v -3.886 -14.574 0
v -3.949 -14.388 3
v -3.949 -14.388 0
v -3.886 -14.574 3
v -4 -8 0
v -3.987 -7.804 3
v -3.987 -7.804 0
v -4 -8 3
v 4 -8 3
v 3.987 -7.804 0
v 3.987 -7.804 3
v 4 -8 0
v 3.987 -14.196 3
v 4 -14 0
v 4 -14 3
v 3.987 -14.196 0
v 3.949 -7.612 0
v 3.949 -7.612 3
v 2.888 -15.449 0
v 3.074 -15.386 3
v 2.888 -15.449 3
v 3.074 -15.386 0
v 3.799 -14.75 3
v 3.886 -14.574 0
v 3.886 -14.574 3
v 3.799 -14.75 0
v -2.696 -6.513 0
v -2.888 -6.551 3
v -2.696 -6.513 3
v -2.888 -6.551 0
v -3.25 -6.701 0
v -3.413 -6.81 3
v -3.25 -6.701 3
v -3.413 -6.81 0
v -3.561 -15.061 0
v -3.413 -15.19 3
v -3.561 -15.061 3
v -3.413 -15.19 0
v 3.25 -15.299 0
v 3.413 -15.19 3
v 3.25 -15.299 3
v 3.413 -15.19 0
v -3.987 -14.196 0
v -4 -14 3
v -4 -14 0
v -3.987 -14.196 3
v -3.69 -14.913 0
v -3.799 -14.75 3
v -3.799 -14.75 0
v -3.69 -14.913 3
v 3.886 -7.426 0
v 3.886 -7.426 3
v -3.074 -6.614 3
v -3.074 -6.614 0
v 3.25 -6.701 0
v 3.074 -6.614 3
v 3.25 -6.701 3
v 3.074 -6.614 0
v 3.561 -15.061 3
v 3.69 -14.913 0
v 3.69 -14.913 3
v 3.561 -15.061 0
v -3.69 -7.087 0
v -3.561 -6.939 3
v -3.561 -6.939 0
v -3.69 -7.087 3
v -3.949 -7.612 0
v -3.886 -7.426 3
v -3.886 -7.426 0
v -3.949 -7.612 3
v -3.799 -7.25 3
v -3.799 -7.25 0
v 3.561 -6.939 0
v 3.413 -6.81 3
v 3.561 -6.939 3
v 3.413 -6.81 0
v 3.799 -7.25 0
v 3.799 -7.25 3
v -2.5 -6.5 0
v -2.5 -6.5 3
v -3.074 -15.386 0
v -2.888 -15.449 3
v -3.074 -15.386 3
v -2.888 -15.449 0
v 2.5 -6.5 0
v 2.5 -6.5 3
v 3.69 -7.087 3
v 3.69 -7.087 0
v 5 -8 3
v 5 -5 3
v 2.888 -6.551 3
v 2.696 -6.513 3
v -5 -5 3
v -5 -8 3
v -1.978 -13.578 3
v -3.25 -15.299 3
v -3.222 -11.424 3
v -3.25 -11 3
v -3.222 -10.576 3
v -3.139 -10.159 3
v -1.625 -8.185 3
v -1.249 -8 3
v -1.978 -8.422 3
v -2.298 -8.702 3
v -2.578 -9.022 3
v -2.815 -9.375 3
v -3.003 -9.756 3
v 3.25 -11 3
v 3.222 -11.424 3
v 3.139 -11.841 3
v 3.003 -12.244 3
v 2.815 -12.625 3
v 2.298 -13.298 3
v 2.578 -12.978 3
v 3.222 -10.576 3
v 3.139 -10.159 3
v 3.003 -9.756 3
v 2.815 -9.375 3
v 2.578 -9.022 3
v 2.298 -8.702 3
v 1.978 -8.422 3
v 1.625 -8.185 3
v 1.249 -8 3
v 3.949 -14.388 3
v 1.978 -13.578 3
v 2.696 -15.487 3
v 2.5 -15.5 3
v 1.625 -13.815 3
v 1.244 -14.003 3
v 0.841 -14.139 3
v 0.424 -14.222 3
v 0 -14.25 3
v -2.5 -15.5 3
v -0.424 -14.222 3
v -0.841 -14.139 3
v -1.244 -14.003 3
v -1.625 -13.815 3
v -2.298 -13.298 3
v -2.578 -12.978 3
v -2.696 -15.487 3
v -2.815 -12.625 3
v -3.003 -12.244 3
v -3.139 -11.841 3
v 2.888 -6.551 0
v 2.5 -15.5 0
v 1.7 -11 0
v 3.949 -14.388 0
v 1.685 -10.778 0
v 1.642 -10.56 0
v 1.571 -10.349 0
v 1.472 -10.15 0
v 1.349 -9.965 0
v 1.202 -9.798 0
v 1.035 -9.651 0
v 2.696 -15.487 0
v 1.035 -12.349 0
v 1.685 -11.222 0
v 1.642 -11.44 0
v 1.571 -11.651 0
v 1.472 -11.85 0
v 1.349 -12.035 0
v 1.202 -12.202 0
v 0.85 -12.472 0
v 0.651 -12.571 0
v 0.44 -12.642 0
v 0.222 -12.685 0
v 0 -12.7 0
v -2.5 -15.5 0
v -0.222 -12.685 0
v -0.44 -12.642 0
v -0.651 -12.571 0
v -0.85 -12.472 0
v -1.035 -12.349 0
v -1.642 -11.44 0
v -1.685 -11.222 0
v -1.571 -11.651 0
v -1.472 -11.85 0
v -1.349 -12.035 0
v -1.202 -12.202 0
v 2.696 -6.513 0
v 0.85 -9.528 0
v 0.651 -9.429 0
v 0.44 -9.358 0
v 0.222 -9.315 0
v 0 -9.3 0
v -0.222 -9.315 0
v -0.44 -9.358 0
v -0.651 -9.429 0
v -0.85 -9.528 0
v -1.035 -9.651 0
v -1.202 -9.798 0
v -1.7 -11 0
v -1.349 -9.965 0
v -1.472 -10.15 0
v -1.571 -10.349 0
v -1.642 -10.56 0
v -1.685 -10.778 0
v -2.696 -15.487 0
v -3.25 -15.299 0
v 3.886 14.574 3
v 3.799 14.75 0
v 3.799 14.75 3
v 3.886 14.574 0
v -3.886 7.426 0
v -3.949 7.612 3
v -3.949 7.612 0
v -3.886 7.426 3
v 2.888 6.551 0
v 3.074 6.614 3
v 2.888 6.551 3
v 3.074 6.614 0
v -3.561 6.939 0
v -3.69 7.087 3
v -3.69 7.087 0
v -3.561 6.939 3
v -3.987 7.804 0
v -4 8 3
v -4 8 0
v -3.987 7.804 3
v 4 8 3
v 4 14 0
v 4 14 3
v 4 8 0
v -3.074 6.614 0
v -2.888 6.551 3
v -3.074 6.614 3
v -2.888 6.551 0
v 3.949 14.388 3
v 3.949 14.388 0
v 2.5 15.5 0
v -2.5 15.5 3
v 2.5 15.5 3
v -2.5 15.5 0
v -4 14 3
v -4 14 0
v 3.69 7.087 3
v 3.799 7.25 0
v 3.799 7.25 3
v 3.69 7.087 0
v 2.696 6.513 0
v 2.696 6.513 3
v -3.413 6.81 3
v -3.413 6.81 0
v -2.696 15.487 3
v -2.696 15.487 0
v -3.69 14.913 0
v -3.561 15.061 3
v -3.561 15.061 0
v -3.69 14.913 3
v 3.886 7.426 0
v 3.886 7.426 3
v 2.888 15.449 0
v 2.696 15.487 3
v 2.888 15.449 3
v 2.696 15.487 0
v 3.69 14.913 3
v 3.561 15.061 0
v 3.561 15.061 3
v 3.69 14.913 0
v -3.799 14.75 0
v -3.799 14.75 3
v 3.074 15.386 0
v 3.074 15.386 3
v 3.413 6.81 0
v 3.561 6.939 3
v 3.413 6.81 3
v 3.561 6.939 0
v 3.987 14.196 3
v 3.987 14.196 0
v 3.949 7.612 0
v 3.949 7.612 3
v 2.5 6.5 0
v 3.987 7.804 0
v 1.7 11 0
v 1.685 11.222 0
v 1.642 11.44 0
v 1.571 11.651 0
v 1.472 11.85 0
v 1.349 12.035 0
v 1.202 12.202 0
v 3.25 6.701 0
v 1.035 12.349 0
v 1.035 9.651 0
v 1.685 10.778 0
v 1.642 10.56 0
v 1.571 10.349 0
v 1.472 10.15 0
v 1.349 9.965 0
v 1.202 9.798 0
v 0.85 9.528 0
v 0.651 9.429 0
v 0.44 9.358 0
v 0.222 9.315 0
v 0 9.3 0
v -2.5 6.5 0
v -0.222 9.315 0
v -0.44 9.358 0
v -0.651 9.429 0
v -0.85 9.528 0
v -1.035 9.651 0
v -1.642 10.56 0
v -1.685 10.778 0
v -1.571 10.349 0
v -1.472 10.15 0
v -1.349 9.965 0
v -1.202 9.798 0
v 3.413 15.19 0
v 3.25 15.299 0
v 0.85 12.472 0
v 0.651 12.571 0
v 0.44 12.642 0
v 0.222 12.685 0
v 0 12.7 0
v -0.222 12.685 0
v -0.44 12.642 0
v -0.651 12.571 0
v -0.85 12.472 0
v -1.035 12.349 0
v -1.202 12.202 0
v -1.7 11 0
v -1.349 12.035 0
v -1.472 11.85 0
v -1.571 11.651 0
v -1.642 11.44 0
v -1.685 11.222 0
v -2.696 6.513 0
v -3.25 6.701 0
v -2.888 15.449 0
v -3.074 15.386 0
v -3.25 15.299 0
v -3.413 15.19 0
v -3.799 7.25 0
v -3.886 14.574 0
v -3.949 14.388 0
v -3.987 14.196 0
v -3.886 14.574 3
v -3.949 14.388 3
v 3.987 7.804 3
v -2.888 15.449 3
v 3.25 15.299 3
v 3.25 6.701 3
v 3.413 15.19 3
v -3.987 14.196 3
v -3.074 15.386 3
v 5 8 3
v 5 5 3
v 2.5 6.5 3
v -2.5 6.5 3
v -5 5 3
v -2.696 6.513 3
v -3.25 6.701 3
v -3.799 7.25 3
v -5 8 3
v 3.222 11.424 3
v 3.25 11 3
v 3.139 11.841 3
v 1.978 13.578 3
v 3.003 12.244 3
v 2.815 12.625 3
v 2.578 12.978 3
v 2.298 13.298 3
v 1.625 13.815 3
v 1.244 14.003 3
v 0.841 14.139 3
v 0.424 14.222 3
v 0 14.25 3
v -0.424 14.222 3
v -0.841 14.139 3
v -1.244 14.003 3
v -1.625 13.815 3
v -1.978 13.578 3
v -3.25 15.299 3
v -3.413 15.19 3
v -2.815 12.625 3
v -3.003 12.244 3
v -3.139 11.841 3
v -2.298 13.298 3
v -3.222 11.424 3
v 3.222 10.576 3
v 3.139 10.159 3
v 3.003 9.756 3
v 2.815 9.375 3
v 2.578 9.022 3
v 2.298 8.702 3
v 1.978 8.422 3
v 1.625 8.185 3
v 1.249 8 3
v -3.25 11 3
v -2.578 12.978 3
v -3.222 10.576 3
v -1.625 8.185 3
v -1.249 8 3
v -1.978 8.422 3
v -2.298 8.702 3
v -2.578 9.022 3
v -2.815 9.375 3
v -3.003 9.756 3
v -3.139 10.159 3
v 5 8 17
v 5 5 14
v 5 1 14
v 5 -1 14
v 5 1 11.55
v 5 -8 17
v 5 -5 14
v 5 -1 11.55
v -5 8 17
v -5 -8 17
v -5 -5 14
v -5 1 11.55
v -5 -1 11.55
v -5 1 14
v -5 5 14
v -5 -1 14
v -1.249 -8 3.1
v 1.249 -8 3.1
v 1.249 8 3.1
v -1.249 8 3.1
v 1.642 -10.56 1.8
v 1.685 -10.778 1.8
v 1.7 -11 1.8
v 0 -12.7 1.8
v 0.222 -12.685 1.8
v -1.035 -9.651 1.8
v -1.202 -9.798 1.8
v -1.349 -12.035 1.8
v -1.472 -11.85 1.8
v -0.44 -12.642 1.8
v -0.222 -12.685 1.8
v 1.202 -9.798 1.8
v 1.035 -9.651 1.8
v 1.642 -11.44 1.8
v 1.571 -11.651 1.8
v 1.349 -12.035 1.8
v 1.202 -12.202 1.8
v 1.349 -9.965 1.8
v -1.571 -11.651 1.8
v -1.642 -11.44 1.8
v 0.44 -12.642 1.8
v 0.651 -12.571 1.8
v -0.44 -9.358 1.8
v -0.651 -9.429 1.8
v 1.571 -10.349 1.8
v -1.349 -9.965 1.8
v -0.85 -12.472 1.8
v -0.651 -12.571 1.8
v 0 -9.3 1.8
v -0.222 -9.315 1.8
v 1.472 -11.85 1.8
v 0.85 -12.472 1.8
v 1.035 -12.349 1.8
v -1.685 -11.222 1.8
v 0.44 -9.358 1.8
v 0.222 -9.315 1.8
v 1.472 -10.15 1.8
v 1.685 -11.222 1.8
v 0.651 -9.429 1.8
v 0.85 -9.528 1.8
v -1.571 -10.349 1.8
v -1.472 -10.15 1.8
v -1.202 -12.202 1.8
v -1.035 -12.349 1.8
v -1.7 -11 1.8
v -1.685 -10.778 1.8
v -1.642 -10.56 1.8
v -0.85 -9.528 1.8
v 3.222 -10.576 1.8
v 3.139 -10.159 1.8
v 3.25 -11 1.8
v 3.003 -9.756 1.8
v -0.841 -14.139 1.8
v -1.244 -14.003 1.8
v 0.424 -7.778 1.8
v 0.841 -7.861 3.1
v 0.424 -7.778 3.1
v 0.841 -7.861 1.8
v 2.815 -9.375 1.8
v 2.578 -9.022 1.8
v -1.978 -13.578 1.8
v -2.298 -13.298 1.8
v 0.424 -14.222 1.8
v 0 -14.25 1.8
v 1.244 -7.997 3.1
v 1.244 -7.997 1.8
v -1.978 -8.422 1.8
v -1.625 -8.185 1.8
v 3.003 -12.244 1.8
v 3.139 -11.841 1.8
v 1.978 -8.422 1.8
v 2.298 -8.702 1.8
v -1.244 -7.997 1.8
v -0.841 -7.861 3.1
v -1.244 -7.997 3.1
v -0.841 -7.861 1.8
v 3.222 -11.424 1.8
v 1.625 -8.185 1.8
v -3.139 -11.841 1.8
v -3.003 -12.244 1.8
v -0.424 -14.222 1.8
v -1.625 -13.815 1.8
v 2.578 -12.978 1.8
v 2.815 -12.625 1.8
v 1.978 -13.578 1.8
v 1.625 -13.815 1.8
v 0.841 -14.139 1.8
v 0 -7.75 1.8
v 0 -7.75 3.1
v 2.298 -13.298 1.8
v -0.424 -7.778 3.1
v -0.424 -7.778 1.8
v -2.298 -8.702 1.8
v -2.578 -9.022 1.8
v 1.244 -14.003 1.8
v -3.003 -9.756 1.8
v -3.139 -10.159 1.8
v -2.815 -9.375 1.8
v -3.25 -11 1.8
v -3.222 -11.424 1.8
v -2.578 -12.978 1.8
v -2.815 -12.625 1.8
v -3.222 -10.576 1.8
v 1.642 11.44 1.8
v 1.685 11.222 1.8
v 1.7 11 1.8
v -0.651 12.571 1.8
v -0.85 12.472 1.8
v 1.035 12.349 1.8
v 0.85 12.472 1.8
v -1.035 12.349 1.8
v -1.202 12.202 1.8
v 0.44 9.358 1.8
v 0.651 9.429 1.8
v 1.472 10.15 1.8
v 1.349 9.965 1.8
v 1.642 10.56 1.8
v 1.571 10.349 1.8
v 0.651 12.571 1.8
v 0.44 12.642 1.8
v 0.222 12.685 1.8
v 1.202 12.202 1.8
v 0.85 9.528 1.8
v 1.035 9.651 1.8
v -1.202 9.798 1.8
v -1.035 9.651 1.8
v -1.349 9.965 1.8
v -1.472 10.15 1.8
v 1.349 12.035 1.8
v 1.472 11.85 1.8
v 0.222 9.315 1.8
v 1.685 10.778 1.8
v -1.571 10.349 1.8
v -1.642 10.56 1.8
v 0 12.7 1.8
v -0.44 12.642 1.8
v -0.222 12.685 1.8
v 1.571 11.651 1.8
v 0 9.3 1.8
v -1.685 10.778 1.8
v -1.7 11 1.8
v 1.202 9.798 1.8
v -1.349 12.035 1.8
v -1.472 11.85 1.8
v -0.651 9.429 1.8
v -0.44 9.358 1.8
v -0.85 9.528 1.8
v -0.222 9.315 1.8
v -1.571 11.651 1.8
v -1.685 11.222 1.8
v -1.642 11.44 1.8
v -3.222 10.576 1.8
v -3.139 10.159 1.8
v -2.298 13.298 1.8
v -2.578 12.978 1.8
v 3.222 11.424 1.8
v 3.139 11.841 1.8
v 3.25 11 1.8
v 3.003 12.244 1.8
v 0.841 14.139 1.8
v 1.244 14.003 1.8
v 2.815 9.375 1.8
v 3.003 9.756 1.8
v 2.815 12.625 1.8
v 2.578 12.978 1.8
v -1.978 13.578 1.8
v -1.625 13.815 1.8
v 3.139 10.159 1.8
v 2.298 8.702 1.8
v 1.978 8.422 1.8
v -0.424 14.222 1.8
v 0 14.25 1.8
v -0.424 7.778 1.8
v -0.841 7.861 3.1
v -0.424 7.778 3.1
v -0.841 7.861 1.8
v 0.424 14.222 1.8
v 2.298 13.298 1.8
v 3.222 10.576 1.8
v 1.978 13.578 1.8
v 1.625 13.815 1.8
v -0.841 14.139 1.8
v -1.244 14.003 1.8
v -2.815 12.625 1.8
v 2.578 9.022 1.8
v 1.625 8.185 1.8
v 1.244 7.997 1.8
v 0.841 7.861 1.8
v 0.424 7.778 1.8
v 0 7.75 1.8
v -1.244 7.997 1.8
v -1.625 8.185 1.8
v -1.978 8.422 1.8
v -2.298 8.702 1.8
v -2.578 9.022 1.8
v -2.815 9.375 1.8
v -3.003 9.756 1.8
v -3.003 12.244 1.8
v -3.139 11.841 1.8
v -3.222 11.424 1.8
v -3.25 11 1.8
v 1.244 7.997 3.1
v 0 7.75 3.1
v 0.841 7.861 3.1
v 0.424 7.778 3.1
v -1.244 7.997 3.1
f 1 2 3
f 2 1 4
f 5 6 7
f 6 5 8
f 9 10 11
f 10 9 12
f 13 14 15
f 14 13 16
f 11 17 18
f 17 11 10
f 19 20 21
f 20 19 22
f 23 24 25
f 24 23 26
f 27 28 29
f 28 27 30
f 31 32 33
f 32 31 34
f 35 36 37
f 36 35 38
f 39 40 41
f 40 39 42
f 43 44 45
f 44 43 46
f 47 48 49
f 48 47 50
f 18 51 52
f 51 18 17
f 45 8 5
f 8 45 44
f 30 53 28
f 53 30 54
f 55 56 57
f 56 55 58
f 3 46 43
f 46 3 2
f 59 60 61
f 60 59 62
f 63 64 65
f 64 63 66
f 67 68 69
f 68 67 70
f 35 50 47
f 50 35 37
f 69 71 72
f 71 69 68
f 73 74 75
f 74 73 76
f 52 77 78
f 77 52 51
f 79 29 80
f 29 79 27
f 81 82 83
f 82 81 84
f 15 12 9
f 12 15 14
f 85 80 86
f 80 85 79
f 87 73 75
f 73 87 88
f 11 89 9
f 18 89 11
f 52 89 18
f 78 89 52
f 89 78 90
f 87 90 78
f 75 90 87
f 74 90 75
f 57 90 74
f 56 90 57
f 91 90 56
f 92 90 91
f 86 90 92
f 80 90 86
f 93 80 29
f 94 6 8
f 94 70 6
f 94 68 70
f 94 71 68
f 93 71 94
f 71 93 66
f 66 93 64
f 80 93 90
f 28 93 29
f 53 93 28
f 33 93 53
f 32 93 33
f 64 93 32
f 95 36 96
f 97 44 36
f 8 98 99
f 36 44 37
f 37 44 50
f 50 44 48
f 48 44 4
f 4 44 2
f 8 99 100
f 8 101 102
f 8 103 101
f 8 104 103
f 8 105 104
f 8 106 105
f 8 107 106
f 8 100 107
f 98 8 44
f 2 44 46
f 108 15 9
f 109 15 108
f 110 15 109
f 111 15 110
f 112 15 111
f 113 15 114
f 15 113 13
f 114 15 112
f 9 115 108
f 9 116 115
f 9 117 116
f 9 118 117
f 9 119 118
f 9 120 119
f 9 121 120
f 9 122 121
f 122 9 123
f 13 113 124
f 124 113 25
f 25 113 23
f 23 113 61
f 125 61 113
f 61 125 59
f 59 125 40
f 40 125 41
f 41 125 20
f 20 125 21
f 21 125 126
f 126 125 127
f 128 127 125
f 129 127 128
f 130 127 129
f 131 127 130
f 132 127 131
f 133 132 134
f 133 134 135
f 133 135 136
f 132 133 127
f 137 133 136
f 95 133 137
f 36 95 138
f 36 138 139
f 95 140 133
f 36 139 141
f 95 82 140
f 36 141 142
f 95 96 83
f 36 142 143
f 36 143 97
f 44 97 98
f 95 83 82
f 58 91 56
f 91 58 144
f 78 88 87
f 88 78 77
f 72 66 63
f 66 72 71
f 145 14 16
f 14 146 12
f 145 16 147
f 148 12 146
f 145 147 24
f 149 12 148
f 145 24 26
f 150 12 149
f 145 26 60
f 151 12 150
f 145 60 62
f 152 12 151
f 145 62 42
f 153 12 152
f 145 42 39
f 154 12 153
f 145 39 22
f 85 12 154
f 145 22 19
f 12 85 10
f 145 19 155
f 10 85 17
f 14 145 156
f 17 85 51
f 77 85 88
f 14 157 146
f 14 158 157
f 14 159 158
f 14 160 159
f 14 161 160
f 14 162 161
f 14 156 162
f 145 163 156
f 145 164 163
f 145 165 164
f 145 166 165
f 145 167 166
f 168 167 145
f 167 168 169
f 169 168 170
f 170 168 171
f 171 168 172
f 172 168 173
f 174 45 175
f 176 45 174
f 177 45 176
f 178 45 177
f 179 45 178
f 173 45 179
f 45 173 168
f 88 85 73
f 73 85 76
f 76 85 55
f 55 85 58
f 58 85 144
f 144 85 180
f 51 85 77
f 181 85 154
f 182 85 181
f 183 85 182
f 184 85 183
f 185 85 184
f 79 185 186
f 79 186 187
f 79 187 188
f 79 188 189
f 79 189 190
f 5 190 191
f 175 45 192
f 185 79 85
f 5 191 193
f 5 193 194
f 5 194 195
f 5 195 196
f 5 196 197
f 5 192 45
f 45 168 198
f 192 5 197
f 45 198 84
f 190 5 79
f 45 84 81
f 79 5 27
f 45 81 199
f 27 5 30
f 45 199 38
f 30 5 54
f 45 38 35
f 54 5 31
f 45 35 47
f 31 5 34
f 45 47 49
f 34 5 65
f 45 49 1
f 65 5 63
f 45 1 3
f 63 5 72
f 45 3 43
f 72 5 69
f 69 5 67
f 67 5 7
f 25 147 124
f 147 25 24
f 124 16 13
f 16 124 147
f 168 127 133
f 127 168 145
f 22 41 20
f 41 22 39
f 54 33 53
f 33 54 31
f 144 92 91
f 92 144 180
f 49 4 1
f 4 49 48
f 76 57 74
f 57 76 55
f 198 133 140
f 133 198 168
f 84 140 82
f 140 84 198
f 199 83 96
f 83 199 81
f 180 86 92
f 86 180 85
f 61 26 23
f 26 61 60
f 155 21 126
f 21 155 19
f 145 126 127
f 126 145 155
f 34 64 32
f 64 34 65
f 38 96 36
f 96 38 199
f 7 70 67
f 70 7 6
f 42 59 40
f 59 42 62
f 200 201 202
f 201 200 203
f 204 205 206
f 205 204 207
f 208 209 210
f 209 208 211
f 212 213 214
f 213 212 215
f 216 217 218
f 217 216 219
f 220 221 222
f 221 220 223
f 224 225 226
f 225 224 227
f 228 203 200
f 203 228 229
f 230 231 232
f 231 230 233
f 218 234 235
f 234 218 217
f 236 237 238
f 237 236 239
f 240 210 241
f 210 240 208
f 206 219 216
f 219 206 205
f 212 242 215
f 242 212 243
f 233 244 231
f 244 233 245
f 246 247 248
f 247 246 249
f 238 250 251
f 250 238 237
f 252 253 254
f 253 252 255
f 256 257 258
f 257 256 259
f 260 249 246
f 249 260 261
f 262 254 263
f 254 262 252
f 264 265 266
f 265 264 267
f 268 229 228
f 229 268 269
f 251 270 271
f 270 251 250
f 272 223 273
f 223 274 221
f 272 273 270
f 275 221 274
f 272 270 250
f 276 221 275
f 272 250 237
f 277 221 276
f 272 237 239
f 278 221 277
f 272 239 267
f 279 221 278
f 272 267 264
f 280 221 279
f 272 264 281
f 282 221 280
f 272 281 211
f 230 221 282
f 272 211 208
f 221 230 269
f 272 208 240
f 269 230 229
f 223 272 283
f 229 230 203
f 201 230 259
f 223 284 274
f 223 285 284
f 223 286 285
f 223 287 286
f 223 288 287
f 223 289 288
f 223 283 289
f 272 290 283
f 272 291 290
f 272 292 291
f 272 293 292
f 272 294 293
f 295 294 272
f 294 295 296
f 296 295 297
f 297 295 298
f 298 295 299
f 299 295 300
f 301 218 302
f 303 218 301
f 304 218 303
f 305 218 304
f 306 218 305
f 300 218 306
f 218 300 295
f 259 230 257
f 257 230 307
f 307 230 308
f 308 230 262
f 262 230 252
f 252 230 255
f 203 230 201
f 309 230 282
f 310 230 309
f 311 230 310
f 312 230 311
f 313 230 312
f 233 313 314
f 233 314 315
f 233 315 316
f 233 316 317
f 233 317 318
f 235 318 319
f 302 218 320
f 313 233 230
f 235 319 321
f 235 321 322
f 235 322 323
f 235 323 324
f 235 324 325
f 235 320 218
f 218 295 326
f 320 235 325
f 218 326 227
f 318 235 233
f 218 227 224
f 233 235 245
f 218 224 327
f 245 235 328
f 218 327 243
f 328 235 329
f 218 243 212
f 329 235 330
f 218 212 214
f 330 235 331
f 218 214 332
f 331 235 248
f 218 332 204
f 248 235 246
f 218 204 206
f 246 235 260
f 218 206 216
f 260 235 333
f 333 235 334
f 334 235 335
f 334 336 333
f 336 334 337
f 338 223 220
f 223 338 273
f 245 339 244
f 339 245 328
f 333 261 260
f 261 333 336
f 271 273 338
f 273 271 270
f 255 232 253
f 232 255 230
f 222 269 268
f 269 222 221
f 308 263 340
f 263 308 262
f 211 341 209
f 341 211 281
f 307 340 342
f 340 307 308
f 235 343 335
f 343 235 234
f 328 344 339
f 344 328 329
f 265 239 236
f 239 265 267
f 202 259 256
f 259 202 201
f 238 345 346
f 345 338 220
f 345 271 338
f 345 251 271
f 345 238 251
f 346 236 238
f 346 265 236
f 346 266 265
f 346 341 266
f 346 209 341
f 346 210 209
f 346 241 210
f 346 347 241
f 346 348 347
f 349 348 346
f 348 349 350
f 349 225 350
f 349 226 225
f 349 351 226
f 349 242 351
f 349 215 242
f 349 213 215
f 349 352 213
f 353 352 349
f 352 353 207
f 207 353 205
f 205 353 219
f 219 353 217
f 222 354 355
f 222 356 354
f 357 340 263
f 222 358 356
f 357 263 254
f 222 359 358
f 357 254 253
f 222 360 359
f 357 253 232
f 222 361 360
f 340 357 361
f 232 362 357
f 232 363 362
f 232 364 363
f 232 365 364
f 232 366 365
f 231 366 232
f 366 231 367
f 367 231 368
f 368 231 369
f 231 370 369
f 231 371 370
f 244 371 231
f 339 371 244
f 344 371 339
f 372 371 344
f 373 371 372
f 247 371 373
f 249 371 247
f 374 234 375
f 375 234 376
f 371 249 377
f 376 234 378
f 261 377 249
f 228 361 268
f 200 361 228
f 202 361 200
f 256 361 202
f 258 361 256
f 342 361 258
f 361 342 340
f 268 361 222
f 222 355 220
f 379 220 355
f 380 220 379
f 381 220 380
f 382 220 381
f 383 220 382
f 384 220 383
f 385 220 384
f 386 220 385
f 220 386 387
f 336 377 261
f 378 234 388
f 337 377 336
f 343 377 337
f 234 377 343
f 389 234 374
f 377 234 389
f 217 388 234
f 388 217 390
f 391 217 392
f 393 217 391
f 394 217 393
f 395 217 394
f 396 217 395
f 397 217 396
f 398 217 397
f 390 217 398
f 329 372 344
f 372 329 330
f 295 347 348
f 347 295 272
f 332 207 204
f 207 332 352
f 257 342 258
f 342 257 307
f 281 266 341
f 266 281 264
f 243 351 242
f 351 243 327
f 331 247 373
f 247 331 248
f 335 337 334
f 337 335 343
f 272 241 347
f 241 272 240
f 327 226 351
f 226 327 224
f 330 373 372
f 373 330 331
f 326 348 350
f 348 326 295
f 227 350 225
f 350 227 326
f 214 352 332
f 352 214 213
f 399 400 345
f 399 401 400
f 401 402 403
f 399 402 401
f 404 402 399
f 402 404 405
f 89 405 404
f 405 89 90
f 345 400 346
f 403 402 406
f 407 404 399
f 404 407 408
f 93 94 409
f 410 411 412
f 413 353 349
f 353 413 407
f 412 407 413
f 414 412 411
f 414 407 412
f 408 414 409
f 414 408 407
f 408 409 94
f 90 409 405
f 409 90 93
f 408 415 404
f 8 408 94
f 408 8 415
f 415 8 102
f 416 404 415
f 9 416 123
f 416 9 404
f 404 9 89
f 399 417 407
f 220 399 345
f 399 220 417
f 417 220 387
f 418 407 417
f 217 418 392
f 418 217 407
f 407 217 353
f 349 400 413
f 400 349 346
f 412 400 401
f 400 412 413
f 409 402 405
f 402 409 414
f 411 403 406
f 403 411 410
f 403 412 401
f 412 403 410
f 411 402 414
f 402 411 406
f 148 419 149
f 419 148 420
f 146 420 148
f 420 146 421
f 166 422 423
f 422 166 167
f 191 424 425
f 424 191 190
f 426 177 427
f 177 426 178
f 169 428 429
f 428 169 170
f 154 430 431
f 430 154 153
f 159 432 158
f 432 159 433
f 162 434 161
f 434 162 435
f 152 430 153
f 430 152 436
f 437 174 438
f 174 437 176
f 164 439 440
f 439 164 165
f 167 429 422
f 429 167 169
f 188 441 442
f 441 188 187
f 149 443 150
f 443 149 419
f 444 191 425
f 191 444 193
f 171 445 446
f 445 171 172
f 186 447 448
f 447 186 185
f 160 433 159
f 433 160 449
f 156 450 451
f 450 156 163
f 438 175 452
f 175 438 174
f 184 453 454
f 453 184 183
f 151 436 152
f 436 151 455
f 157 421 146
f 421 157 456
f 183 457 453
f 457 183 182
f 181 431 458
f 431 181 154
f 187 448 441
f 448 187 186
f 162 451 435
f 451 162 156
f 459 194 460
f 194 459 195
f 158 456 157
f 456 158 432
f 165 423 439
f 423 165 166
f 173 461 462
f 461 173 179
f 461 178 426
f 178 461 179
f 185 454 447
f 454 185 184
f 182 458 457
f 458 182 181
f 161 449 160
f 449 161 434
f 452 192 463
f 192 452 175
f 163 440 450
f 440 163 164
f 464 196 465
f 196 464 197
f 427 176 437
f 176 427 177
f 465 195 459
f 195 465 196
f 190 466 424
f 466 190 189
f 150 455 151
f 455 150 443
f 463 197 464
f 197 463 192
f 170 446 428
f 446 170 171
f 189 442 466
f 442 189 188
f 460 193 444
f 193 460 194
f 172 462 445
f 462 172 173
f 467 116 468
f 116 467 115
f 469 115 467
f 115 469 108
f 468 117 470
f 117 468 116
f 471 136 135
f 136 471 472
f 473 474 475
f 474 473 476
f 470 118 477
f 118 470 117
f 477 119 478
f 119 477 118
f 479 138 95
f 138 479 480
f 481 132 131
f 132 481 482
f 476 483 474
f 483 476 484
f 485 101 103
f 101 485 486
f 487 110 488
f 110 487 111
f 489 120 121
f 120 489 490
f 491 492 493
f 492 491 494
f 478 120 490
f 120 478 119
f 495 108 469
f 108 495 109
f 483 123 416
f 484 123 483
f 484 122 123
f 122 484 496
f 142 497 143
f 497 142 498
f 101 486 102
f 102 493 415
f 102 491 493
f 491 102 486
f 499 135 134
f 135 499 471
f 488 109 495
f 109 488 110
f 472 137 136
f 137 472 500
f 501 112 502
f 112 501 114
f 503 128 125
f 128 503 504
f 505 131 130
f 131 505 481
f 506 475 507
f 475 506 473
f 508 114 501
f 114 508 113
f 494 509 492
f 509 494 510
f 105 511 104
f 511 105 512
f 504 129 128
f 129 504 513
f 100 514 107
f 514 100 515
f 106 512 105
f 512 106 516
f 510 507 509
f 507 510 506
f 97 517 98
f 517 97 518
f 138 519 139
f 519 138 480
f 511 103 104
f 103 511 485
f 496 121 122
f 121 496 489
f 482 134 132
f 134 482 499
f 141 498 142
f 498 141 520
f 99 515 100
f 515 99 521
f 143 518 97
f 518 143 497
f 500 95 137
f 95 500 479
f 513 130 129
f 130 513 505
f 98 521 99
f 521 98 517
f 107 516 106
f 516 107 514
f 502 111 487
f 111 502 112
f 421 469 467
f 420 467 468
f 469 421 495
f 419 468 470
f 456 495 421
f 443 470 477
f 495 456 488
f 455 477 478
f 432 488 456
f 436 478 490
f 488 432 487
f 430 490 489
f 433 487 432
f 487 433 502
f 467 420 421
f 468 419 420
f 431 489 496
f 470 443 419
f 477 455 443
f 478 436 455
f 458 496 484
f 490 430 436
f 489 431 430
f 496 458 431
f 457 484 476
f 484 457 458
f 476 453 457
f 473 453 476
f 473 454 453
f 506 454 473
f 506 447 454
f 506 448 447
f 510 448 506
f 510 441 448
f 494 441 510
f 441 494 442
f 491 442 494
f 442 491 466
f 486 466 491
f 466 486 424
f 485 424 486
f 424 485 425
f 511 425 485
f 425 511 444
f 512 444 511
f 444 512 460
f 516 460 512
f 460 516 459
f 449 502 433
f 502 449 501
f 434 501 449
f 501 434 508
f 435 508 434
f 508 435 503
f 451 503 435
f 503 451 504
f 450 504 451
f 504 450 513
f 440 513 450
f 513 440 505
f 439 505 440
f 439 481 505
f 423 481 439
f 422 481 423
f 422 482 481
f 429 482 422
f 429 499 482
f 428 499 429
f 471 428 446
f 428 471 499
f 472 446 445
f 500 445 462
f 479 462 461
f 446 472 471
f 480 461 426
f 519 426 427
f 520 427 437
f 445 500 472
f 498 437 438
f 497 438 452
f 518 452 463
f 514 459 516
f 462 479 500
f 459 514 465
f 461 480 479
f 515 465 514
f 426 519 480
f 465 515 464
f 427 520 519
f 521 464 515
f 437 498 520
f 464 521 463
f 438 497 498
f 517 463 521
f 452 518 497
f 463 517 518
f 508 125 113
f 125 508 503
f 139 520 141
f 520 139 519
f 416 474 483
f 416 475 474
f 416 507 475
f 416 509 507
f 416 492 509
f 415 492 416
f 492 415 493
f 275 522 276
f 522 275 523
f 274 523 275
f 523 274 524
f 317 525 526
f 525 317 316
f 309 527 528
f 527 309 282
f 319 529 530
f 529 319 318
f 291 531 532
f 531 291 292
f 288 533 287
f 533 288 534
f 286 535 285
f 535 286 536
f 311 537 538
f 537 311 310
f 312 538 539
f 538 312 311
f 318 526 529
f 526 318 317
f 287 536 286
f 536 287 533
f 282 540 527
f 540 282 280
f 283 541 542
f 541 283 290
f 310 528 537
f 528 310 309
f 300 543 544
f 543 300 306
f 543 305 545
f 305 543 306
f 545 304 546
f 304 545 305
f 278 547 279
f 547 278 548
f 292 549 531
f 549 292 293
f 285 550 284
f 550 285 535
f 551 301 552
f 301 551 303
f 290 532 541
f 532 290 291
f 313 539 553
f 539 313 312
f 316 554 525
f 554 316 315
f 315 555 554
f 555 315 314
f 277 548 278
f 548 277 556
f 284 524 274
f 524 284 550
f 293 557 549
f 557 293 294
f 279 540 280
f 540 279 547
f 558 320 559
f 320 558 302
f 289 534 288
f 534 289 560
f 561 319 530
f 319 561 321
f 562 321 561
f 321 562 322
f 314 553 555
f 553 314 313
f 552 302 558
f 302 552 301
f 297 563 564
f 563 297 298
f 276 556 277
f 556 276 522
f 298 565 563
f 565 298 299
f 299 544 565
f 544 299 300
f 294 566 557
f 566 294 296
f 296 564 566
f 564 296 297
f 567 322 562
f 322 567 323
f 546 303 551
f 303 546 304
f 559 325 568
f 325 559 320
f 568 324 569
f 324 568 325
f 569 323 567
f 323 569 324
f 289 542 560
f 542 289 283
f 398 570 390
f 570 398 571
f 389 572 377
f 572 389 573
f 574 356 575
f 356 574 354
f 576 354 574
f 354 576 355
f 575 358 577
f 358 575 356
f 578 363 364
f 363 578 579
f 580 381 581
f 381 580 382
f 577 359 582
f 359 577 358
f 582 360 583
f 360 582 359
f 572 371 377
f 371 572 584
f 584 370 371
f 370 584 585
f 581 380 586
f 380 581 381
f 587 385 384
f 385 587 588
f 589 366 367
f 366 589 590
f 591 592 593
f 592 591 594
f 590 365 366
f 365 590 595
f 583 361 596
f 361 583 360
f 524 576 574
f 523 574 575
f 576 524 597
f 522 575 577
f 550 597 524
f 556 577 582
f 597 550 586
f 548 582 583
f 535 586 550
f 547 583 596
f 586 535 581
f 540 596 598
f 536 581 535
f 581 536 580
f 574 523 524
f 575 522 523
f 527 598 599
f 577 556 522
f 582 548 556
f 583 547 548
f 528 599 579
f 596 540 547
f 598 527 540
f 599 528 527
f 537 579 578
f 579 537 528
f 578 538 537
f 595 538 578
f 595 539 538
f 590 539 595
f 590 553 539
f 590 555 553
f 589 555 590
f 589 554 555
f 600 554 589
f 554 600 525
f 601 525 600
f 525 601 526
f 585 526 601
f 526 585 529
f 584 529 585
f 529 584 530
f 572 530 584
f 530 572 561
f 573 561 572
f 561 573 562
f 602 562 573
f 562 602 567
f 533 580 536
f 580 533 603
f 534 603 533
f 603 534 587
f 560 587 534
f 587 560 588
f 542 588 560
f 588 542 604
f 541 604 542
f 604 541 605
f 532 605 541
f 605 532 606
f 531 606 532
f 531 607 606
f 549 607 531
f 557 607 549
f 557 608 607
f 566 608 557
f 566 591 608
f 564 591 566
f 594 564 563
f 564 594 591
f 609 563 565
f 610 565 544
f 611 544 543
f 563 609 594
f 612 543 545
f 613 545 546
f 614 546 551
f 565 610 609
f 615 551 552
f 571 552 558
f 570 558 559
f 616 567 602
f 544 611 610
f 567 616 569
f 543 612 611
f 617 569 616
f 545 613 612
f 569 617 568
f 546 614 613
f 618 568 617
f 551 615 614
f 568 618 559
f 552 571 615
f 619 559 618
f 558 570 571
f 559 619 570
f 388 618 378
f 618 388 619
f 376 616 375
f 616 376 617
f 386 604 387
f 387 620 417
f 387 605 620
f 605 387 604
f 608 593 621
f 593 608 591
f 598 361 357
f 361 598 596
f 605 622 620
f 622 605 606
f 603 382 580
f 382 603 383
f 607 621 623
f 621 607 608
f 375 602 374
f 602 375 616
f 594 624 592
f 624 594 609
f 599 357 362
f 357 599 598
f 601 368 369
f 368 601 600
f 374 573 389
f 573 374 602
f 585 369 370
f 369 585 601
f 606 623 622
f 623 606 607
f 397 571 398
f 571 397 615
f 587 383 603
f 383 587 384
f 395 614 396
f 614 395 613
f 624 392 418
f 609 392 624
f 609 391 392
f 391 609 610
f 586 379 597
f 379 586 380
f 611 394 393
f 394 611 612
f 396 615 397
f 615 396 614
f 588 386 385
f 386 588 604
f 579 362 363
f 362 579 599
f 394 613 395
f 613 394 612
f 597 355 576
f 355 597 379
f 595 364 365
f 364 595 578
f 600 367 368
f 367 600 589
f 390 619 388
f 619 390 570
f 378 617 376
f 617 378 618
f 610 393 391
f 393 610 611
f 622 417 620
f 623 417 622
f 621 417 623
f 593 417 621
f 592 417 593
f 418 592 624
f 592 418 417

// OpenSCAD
// Open-bottom relay clamp pattern.
// Two screw feet plus a top bridge; no bottom tray under the relay.

$fn = 48;

relay_clamp_foot_width = 8;
relay_clamp_foot_length = 9;
relay_clamp_foot_thickness = 3;
relay_clamp_screw_spacing = 22;
relay_clamp_screw_diameter = 3.4;
relay_clamp_head_diameter = 6.5;
relay_clamp_head_recess_depth = 1.2;

relay_clamp_bridge_width = 10;
relay_clamp_bridge_length = relay_clamp_screw_spacing - relay_clamp_foot_length + 2;
relay_clamp_bridge_height = 14;
relay_clamp_bridge_thickness = 3;
relay_capture_lip_depth = 2;
relay_capture_lip_height = 2.5;

module rounded_rect_2d(w, d, r) {
    hull()
        for (x = [-w / 2 + r, w / 2 - r])
            for (y = [-d / 2 + r, d / 2 - r])
                translate([x, y])
                    circle(r = r);
}

module screw_foot(y) {
    translate([0, y, 0])
        linear_extrude(height = relay_clamp_foot_thickness)
            rounded_rect_2d(relay_clamp_foot_width, relay_clamp_foot_length, 1.5);
}

module open_bottom_relay_clamp() {
    difference() {
        union() {
            for (sy = [-1, 1])
                screw_foot(sy * relay_clamp_screw_spacing / 2);

            for (sy = [-1, 1])
                translate([
                    -relay_clamp_bridge_width / 2,
                    sy * (relay_clamp_screw_spacing / 2 - relay_clamp_foot_length / 2)
                        - relay_clamp_bridge_thickness / 2,
                    relay_clamp_foot_thickness
                ])
                    cube([
                        relay_clamp_bridge_width,
                        relay_clamp_bridge_thickness,
                        relay_clamp_bridge_height
                    ]);

            translate([
                -relay_clamp_bridge_width / 2,
                -relay_clamp_bridge_length / 2,
                relay_clamp_foot_thickness + relay_clamp_bridge_height
                    - relay_clamp_bridge_thickness
            ])
                cube([
                    relay_clamp_bridge_width,
                    relay_clamp_bridge_length,
                    relay_clamp_bridge_thickness
                ]);

            translate([
                -relay_clamp_bridge_width / 2,
                -relay_capture_lip_depth / 2,
                relay_clamp_foot_thickness + relay_clamp_bridge_height
                    - relay_clamp_bridge_thickness
                    - relay_capture_lip_height
                    + 0.05
            ])
                cube([
                    relay_clamp_bridge_width,
                    relay_capture_lip_depth,
                    relay_capture_lip_height
                ]);
        }

        for (sy = [-1, 1]) {
            y = sy * relay_clamp_screw_spacing / 2;
            translate([0, y, -0.05])
                cylinder(
                    h = relay_clamp_foot_thickness + 0.1,
                    d = relay_clamp_screw_diameter
                );
            translate([0, y, relay_clamp_foot_thickness - relay_clamp_head_recess_depth])
                cylinder(
                    h = relay_clamp_head_recess_depth + 0.1,
                    d = relay_clamp_head_diameter
                );
        }
    }
}

open_bottom_relay_clamp();
